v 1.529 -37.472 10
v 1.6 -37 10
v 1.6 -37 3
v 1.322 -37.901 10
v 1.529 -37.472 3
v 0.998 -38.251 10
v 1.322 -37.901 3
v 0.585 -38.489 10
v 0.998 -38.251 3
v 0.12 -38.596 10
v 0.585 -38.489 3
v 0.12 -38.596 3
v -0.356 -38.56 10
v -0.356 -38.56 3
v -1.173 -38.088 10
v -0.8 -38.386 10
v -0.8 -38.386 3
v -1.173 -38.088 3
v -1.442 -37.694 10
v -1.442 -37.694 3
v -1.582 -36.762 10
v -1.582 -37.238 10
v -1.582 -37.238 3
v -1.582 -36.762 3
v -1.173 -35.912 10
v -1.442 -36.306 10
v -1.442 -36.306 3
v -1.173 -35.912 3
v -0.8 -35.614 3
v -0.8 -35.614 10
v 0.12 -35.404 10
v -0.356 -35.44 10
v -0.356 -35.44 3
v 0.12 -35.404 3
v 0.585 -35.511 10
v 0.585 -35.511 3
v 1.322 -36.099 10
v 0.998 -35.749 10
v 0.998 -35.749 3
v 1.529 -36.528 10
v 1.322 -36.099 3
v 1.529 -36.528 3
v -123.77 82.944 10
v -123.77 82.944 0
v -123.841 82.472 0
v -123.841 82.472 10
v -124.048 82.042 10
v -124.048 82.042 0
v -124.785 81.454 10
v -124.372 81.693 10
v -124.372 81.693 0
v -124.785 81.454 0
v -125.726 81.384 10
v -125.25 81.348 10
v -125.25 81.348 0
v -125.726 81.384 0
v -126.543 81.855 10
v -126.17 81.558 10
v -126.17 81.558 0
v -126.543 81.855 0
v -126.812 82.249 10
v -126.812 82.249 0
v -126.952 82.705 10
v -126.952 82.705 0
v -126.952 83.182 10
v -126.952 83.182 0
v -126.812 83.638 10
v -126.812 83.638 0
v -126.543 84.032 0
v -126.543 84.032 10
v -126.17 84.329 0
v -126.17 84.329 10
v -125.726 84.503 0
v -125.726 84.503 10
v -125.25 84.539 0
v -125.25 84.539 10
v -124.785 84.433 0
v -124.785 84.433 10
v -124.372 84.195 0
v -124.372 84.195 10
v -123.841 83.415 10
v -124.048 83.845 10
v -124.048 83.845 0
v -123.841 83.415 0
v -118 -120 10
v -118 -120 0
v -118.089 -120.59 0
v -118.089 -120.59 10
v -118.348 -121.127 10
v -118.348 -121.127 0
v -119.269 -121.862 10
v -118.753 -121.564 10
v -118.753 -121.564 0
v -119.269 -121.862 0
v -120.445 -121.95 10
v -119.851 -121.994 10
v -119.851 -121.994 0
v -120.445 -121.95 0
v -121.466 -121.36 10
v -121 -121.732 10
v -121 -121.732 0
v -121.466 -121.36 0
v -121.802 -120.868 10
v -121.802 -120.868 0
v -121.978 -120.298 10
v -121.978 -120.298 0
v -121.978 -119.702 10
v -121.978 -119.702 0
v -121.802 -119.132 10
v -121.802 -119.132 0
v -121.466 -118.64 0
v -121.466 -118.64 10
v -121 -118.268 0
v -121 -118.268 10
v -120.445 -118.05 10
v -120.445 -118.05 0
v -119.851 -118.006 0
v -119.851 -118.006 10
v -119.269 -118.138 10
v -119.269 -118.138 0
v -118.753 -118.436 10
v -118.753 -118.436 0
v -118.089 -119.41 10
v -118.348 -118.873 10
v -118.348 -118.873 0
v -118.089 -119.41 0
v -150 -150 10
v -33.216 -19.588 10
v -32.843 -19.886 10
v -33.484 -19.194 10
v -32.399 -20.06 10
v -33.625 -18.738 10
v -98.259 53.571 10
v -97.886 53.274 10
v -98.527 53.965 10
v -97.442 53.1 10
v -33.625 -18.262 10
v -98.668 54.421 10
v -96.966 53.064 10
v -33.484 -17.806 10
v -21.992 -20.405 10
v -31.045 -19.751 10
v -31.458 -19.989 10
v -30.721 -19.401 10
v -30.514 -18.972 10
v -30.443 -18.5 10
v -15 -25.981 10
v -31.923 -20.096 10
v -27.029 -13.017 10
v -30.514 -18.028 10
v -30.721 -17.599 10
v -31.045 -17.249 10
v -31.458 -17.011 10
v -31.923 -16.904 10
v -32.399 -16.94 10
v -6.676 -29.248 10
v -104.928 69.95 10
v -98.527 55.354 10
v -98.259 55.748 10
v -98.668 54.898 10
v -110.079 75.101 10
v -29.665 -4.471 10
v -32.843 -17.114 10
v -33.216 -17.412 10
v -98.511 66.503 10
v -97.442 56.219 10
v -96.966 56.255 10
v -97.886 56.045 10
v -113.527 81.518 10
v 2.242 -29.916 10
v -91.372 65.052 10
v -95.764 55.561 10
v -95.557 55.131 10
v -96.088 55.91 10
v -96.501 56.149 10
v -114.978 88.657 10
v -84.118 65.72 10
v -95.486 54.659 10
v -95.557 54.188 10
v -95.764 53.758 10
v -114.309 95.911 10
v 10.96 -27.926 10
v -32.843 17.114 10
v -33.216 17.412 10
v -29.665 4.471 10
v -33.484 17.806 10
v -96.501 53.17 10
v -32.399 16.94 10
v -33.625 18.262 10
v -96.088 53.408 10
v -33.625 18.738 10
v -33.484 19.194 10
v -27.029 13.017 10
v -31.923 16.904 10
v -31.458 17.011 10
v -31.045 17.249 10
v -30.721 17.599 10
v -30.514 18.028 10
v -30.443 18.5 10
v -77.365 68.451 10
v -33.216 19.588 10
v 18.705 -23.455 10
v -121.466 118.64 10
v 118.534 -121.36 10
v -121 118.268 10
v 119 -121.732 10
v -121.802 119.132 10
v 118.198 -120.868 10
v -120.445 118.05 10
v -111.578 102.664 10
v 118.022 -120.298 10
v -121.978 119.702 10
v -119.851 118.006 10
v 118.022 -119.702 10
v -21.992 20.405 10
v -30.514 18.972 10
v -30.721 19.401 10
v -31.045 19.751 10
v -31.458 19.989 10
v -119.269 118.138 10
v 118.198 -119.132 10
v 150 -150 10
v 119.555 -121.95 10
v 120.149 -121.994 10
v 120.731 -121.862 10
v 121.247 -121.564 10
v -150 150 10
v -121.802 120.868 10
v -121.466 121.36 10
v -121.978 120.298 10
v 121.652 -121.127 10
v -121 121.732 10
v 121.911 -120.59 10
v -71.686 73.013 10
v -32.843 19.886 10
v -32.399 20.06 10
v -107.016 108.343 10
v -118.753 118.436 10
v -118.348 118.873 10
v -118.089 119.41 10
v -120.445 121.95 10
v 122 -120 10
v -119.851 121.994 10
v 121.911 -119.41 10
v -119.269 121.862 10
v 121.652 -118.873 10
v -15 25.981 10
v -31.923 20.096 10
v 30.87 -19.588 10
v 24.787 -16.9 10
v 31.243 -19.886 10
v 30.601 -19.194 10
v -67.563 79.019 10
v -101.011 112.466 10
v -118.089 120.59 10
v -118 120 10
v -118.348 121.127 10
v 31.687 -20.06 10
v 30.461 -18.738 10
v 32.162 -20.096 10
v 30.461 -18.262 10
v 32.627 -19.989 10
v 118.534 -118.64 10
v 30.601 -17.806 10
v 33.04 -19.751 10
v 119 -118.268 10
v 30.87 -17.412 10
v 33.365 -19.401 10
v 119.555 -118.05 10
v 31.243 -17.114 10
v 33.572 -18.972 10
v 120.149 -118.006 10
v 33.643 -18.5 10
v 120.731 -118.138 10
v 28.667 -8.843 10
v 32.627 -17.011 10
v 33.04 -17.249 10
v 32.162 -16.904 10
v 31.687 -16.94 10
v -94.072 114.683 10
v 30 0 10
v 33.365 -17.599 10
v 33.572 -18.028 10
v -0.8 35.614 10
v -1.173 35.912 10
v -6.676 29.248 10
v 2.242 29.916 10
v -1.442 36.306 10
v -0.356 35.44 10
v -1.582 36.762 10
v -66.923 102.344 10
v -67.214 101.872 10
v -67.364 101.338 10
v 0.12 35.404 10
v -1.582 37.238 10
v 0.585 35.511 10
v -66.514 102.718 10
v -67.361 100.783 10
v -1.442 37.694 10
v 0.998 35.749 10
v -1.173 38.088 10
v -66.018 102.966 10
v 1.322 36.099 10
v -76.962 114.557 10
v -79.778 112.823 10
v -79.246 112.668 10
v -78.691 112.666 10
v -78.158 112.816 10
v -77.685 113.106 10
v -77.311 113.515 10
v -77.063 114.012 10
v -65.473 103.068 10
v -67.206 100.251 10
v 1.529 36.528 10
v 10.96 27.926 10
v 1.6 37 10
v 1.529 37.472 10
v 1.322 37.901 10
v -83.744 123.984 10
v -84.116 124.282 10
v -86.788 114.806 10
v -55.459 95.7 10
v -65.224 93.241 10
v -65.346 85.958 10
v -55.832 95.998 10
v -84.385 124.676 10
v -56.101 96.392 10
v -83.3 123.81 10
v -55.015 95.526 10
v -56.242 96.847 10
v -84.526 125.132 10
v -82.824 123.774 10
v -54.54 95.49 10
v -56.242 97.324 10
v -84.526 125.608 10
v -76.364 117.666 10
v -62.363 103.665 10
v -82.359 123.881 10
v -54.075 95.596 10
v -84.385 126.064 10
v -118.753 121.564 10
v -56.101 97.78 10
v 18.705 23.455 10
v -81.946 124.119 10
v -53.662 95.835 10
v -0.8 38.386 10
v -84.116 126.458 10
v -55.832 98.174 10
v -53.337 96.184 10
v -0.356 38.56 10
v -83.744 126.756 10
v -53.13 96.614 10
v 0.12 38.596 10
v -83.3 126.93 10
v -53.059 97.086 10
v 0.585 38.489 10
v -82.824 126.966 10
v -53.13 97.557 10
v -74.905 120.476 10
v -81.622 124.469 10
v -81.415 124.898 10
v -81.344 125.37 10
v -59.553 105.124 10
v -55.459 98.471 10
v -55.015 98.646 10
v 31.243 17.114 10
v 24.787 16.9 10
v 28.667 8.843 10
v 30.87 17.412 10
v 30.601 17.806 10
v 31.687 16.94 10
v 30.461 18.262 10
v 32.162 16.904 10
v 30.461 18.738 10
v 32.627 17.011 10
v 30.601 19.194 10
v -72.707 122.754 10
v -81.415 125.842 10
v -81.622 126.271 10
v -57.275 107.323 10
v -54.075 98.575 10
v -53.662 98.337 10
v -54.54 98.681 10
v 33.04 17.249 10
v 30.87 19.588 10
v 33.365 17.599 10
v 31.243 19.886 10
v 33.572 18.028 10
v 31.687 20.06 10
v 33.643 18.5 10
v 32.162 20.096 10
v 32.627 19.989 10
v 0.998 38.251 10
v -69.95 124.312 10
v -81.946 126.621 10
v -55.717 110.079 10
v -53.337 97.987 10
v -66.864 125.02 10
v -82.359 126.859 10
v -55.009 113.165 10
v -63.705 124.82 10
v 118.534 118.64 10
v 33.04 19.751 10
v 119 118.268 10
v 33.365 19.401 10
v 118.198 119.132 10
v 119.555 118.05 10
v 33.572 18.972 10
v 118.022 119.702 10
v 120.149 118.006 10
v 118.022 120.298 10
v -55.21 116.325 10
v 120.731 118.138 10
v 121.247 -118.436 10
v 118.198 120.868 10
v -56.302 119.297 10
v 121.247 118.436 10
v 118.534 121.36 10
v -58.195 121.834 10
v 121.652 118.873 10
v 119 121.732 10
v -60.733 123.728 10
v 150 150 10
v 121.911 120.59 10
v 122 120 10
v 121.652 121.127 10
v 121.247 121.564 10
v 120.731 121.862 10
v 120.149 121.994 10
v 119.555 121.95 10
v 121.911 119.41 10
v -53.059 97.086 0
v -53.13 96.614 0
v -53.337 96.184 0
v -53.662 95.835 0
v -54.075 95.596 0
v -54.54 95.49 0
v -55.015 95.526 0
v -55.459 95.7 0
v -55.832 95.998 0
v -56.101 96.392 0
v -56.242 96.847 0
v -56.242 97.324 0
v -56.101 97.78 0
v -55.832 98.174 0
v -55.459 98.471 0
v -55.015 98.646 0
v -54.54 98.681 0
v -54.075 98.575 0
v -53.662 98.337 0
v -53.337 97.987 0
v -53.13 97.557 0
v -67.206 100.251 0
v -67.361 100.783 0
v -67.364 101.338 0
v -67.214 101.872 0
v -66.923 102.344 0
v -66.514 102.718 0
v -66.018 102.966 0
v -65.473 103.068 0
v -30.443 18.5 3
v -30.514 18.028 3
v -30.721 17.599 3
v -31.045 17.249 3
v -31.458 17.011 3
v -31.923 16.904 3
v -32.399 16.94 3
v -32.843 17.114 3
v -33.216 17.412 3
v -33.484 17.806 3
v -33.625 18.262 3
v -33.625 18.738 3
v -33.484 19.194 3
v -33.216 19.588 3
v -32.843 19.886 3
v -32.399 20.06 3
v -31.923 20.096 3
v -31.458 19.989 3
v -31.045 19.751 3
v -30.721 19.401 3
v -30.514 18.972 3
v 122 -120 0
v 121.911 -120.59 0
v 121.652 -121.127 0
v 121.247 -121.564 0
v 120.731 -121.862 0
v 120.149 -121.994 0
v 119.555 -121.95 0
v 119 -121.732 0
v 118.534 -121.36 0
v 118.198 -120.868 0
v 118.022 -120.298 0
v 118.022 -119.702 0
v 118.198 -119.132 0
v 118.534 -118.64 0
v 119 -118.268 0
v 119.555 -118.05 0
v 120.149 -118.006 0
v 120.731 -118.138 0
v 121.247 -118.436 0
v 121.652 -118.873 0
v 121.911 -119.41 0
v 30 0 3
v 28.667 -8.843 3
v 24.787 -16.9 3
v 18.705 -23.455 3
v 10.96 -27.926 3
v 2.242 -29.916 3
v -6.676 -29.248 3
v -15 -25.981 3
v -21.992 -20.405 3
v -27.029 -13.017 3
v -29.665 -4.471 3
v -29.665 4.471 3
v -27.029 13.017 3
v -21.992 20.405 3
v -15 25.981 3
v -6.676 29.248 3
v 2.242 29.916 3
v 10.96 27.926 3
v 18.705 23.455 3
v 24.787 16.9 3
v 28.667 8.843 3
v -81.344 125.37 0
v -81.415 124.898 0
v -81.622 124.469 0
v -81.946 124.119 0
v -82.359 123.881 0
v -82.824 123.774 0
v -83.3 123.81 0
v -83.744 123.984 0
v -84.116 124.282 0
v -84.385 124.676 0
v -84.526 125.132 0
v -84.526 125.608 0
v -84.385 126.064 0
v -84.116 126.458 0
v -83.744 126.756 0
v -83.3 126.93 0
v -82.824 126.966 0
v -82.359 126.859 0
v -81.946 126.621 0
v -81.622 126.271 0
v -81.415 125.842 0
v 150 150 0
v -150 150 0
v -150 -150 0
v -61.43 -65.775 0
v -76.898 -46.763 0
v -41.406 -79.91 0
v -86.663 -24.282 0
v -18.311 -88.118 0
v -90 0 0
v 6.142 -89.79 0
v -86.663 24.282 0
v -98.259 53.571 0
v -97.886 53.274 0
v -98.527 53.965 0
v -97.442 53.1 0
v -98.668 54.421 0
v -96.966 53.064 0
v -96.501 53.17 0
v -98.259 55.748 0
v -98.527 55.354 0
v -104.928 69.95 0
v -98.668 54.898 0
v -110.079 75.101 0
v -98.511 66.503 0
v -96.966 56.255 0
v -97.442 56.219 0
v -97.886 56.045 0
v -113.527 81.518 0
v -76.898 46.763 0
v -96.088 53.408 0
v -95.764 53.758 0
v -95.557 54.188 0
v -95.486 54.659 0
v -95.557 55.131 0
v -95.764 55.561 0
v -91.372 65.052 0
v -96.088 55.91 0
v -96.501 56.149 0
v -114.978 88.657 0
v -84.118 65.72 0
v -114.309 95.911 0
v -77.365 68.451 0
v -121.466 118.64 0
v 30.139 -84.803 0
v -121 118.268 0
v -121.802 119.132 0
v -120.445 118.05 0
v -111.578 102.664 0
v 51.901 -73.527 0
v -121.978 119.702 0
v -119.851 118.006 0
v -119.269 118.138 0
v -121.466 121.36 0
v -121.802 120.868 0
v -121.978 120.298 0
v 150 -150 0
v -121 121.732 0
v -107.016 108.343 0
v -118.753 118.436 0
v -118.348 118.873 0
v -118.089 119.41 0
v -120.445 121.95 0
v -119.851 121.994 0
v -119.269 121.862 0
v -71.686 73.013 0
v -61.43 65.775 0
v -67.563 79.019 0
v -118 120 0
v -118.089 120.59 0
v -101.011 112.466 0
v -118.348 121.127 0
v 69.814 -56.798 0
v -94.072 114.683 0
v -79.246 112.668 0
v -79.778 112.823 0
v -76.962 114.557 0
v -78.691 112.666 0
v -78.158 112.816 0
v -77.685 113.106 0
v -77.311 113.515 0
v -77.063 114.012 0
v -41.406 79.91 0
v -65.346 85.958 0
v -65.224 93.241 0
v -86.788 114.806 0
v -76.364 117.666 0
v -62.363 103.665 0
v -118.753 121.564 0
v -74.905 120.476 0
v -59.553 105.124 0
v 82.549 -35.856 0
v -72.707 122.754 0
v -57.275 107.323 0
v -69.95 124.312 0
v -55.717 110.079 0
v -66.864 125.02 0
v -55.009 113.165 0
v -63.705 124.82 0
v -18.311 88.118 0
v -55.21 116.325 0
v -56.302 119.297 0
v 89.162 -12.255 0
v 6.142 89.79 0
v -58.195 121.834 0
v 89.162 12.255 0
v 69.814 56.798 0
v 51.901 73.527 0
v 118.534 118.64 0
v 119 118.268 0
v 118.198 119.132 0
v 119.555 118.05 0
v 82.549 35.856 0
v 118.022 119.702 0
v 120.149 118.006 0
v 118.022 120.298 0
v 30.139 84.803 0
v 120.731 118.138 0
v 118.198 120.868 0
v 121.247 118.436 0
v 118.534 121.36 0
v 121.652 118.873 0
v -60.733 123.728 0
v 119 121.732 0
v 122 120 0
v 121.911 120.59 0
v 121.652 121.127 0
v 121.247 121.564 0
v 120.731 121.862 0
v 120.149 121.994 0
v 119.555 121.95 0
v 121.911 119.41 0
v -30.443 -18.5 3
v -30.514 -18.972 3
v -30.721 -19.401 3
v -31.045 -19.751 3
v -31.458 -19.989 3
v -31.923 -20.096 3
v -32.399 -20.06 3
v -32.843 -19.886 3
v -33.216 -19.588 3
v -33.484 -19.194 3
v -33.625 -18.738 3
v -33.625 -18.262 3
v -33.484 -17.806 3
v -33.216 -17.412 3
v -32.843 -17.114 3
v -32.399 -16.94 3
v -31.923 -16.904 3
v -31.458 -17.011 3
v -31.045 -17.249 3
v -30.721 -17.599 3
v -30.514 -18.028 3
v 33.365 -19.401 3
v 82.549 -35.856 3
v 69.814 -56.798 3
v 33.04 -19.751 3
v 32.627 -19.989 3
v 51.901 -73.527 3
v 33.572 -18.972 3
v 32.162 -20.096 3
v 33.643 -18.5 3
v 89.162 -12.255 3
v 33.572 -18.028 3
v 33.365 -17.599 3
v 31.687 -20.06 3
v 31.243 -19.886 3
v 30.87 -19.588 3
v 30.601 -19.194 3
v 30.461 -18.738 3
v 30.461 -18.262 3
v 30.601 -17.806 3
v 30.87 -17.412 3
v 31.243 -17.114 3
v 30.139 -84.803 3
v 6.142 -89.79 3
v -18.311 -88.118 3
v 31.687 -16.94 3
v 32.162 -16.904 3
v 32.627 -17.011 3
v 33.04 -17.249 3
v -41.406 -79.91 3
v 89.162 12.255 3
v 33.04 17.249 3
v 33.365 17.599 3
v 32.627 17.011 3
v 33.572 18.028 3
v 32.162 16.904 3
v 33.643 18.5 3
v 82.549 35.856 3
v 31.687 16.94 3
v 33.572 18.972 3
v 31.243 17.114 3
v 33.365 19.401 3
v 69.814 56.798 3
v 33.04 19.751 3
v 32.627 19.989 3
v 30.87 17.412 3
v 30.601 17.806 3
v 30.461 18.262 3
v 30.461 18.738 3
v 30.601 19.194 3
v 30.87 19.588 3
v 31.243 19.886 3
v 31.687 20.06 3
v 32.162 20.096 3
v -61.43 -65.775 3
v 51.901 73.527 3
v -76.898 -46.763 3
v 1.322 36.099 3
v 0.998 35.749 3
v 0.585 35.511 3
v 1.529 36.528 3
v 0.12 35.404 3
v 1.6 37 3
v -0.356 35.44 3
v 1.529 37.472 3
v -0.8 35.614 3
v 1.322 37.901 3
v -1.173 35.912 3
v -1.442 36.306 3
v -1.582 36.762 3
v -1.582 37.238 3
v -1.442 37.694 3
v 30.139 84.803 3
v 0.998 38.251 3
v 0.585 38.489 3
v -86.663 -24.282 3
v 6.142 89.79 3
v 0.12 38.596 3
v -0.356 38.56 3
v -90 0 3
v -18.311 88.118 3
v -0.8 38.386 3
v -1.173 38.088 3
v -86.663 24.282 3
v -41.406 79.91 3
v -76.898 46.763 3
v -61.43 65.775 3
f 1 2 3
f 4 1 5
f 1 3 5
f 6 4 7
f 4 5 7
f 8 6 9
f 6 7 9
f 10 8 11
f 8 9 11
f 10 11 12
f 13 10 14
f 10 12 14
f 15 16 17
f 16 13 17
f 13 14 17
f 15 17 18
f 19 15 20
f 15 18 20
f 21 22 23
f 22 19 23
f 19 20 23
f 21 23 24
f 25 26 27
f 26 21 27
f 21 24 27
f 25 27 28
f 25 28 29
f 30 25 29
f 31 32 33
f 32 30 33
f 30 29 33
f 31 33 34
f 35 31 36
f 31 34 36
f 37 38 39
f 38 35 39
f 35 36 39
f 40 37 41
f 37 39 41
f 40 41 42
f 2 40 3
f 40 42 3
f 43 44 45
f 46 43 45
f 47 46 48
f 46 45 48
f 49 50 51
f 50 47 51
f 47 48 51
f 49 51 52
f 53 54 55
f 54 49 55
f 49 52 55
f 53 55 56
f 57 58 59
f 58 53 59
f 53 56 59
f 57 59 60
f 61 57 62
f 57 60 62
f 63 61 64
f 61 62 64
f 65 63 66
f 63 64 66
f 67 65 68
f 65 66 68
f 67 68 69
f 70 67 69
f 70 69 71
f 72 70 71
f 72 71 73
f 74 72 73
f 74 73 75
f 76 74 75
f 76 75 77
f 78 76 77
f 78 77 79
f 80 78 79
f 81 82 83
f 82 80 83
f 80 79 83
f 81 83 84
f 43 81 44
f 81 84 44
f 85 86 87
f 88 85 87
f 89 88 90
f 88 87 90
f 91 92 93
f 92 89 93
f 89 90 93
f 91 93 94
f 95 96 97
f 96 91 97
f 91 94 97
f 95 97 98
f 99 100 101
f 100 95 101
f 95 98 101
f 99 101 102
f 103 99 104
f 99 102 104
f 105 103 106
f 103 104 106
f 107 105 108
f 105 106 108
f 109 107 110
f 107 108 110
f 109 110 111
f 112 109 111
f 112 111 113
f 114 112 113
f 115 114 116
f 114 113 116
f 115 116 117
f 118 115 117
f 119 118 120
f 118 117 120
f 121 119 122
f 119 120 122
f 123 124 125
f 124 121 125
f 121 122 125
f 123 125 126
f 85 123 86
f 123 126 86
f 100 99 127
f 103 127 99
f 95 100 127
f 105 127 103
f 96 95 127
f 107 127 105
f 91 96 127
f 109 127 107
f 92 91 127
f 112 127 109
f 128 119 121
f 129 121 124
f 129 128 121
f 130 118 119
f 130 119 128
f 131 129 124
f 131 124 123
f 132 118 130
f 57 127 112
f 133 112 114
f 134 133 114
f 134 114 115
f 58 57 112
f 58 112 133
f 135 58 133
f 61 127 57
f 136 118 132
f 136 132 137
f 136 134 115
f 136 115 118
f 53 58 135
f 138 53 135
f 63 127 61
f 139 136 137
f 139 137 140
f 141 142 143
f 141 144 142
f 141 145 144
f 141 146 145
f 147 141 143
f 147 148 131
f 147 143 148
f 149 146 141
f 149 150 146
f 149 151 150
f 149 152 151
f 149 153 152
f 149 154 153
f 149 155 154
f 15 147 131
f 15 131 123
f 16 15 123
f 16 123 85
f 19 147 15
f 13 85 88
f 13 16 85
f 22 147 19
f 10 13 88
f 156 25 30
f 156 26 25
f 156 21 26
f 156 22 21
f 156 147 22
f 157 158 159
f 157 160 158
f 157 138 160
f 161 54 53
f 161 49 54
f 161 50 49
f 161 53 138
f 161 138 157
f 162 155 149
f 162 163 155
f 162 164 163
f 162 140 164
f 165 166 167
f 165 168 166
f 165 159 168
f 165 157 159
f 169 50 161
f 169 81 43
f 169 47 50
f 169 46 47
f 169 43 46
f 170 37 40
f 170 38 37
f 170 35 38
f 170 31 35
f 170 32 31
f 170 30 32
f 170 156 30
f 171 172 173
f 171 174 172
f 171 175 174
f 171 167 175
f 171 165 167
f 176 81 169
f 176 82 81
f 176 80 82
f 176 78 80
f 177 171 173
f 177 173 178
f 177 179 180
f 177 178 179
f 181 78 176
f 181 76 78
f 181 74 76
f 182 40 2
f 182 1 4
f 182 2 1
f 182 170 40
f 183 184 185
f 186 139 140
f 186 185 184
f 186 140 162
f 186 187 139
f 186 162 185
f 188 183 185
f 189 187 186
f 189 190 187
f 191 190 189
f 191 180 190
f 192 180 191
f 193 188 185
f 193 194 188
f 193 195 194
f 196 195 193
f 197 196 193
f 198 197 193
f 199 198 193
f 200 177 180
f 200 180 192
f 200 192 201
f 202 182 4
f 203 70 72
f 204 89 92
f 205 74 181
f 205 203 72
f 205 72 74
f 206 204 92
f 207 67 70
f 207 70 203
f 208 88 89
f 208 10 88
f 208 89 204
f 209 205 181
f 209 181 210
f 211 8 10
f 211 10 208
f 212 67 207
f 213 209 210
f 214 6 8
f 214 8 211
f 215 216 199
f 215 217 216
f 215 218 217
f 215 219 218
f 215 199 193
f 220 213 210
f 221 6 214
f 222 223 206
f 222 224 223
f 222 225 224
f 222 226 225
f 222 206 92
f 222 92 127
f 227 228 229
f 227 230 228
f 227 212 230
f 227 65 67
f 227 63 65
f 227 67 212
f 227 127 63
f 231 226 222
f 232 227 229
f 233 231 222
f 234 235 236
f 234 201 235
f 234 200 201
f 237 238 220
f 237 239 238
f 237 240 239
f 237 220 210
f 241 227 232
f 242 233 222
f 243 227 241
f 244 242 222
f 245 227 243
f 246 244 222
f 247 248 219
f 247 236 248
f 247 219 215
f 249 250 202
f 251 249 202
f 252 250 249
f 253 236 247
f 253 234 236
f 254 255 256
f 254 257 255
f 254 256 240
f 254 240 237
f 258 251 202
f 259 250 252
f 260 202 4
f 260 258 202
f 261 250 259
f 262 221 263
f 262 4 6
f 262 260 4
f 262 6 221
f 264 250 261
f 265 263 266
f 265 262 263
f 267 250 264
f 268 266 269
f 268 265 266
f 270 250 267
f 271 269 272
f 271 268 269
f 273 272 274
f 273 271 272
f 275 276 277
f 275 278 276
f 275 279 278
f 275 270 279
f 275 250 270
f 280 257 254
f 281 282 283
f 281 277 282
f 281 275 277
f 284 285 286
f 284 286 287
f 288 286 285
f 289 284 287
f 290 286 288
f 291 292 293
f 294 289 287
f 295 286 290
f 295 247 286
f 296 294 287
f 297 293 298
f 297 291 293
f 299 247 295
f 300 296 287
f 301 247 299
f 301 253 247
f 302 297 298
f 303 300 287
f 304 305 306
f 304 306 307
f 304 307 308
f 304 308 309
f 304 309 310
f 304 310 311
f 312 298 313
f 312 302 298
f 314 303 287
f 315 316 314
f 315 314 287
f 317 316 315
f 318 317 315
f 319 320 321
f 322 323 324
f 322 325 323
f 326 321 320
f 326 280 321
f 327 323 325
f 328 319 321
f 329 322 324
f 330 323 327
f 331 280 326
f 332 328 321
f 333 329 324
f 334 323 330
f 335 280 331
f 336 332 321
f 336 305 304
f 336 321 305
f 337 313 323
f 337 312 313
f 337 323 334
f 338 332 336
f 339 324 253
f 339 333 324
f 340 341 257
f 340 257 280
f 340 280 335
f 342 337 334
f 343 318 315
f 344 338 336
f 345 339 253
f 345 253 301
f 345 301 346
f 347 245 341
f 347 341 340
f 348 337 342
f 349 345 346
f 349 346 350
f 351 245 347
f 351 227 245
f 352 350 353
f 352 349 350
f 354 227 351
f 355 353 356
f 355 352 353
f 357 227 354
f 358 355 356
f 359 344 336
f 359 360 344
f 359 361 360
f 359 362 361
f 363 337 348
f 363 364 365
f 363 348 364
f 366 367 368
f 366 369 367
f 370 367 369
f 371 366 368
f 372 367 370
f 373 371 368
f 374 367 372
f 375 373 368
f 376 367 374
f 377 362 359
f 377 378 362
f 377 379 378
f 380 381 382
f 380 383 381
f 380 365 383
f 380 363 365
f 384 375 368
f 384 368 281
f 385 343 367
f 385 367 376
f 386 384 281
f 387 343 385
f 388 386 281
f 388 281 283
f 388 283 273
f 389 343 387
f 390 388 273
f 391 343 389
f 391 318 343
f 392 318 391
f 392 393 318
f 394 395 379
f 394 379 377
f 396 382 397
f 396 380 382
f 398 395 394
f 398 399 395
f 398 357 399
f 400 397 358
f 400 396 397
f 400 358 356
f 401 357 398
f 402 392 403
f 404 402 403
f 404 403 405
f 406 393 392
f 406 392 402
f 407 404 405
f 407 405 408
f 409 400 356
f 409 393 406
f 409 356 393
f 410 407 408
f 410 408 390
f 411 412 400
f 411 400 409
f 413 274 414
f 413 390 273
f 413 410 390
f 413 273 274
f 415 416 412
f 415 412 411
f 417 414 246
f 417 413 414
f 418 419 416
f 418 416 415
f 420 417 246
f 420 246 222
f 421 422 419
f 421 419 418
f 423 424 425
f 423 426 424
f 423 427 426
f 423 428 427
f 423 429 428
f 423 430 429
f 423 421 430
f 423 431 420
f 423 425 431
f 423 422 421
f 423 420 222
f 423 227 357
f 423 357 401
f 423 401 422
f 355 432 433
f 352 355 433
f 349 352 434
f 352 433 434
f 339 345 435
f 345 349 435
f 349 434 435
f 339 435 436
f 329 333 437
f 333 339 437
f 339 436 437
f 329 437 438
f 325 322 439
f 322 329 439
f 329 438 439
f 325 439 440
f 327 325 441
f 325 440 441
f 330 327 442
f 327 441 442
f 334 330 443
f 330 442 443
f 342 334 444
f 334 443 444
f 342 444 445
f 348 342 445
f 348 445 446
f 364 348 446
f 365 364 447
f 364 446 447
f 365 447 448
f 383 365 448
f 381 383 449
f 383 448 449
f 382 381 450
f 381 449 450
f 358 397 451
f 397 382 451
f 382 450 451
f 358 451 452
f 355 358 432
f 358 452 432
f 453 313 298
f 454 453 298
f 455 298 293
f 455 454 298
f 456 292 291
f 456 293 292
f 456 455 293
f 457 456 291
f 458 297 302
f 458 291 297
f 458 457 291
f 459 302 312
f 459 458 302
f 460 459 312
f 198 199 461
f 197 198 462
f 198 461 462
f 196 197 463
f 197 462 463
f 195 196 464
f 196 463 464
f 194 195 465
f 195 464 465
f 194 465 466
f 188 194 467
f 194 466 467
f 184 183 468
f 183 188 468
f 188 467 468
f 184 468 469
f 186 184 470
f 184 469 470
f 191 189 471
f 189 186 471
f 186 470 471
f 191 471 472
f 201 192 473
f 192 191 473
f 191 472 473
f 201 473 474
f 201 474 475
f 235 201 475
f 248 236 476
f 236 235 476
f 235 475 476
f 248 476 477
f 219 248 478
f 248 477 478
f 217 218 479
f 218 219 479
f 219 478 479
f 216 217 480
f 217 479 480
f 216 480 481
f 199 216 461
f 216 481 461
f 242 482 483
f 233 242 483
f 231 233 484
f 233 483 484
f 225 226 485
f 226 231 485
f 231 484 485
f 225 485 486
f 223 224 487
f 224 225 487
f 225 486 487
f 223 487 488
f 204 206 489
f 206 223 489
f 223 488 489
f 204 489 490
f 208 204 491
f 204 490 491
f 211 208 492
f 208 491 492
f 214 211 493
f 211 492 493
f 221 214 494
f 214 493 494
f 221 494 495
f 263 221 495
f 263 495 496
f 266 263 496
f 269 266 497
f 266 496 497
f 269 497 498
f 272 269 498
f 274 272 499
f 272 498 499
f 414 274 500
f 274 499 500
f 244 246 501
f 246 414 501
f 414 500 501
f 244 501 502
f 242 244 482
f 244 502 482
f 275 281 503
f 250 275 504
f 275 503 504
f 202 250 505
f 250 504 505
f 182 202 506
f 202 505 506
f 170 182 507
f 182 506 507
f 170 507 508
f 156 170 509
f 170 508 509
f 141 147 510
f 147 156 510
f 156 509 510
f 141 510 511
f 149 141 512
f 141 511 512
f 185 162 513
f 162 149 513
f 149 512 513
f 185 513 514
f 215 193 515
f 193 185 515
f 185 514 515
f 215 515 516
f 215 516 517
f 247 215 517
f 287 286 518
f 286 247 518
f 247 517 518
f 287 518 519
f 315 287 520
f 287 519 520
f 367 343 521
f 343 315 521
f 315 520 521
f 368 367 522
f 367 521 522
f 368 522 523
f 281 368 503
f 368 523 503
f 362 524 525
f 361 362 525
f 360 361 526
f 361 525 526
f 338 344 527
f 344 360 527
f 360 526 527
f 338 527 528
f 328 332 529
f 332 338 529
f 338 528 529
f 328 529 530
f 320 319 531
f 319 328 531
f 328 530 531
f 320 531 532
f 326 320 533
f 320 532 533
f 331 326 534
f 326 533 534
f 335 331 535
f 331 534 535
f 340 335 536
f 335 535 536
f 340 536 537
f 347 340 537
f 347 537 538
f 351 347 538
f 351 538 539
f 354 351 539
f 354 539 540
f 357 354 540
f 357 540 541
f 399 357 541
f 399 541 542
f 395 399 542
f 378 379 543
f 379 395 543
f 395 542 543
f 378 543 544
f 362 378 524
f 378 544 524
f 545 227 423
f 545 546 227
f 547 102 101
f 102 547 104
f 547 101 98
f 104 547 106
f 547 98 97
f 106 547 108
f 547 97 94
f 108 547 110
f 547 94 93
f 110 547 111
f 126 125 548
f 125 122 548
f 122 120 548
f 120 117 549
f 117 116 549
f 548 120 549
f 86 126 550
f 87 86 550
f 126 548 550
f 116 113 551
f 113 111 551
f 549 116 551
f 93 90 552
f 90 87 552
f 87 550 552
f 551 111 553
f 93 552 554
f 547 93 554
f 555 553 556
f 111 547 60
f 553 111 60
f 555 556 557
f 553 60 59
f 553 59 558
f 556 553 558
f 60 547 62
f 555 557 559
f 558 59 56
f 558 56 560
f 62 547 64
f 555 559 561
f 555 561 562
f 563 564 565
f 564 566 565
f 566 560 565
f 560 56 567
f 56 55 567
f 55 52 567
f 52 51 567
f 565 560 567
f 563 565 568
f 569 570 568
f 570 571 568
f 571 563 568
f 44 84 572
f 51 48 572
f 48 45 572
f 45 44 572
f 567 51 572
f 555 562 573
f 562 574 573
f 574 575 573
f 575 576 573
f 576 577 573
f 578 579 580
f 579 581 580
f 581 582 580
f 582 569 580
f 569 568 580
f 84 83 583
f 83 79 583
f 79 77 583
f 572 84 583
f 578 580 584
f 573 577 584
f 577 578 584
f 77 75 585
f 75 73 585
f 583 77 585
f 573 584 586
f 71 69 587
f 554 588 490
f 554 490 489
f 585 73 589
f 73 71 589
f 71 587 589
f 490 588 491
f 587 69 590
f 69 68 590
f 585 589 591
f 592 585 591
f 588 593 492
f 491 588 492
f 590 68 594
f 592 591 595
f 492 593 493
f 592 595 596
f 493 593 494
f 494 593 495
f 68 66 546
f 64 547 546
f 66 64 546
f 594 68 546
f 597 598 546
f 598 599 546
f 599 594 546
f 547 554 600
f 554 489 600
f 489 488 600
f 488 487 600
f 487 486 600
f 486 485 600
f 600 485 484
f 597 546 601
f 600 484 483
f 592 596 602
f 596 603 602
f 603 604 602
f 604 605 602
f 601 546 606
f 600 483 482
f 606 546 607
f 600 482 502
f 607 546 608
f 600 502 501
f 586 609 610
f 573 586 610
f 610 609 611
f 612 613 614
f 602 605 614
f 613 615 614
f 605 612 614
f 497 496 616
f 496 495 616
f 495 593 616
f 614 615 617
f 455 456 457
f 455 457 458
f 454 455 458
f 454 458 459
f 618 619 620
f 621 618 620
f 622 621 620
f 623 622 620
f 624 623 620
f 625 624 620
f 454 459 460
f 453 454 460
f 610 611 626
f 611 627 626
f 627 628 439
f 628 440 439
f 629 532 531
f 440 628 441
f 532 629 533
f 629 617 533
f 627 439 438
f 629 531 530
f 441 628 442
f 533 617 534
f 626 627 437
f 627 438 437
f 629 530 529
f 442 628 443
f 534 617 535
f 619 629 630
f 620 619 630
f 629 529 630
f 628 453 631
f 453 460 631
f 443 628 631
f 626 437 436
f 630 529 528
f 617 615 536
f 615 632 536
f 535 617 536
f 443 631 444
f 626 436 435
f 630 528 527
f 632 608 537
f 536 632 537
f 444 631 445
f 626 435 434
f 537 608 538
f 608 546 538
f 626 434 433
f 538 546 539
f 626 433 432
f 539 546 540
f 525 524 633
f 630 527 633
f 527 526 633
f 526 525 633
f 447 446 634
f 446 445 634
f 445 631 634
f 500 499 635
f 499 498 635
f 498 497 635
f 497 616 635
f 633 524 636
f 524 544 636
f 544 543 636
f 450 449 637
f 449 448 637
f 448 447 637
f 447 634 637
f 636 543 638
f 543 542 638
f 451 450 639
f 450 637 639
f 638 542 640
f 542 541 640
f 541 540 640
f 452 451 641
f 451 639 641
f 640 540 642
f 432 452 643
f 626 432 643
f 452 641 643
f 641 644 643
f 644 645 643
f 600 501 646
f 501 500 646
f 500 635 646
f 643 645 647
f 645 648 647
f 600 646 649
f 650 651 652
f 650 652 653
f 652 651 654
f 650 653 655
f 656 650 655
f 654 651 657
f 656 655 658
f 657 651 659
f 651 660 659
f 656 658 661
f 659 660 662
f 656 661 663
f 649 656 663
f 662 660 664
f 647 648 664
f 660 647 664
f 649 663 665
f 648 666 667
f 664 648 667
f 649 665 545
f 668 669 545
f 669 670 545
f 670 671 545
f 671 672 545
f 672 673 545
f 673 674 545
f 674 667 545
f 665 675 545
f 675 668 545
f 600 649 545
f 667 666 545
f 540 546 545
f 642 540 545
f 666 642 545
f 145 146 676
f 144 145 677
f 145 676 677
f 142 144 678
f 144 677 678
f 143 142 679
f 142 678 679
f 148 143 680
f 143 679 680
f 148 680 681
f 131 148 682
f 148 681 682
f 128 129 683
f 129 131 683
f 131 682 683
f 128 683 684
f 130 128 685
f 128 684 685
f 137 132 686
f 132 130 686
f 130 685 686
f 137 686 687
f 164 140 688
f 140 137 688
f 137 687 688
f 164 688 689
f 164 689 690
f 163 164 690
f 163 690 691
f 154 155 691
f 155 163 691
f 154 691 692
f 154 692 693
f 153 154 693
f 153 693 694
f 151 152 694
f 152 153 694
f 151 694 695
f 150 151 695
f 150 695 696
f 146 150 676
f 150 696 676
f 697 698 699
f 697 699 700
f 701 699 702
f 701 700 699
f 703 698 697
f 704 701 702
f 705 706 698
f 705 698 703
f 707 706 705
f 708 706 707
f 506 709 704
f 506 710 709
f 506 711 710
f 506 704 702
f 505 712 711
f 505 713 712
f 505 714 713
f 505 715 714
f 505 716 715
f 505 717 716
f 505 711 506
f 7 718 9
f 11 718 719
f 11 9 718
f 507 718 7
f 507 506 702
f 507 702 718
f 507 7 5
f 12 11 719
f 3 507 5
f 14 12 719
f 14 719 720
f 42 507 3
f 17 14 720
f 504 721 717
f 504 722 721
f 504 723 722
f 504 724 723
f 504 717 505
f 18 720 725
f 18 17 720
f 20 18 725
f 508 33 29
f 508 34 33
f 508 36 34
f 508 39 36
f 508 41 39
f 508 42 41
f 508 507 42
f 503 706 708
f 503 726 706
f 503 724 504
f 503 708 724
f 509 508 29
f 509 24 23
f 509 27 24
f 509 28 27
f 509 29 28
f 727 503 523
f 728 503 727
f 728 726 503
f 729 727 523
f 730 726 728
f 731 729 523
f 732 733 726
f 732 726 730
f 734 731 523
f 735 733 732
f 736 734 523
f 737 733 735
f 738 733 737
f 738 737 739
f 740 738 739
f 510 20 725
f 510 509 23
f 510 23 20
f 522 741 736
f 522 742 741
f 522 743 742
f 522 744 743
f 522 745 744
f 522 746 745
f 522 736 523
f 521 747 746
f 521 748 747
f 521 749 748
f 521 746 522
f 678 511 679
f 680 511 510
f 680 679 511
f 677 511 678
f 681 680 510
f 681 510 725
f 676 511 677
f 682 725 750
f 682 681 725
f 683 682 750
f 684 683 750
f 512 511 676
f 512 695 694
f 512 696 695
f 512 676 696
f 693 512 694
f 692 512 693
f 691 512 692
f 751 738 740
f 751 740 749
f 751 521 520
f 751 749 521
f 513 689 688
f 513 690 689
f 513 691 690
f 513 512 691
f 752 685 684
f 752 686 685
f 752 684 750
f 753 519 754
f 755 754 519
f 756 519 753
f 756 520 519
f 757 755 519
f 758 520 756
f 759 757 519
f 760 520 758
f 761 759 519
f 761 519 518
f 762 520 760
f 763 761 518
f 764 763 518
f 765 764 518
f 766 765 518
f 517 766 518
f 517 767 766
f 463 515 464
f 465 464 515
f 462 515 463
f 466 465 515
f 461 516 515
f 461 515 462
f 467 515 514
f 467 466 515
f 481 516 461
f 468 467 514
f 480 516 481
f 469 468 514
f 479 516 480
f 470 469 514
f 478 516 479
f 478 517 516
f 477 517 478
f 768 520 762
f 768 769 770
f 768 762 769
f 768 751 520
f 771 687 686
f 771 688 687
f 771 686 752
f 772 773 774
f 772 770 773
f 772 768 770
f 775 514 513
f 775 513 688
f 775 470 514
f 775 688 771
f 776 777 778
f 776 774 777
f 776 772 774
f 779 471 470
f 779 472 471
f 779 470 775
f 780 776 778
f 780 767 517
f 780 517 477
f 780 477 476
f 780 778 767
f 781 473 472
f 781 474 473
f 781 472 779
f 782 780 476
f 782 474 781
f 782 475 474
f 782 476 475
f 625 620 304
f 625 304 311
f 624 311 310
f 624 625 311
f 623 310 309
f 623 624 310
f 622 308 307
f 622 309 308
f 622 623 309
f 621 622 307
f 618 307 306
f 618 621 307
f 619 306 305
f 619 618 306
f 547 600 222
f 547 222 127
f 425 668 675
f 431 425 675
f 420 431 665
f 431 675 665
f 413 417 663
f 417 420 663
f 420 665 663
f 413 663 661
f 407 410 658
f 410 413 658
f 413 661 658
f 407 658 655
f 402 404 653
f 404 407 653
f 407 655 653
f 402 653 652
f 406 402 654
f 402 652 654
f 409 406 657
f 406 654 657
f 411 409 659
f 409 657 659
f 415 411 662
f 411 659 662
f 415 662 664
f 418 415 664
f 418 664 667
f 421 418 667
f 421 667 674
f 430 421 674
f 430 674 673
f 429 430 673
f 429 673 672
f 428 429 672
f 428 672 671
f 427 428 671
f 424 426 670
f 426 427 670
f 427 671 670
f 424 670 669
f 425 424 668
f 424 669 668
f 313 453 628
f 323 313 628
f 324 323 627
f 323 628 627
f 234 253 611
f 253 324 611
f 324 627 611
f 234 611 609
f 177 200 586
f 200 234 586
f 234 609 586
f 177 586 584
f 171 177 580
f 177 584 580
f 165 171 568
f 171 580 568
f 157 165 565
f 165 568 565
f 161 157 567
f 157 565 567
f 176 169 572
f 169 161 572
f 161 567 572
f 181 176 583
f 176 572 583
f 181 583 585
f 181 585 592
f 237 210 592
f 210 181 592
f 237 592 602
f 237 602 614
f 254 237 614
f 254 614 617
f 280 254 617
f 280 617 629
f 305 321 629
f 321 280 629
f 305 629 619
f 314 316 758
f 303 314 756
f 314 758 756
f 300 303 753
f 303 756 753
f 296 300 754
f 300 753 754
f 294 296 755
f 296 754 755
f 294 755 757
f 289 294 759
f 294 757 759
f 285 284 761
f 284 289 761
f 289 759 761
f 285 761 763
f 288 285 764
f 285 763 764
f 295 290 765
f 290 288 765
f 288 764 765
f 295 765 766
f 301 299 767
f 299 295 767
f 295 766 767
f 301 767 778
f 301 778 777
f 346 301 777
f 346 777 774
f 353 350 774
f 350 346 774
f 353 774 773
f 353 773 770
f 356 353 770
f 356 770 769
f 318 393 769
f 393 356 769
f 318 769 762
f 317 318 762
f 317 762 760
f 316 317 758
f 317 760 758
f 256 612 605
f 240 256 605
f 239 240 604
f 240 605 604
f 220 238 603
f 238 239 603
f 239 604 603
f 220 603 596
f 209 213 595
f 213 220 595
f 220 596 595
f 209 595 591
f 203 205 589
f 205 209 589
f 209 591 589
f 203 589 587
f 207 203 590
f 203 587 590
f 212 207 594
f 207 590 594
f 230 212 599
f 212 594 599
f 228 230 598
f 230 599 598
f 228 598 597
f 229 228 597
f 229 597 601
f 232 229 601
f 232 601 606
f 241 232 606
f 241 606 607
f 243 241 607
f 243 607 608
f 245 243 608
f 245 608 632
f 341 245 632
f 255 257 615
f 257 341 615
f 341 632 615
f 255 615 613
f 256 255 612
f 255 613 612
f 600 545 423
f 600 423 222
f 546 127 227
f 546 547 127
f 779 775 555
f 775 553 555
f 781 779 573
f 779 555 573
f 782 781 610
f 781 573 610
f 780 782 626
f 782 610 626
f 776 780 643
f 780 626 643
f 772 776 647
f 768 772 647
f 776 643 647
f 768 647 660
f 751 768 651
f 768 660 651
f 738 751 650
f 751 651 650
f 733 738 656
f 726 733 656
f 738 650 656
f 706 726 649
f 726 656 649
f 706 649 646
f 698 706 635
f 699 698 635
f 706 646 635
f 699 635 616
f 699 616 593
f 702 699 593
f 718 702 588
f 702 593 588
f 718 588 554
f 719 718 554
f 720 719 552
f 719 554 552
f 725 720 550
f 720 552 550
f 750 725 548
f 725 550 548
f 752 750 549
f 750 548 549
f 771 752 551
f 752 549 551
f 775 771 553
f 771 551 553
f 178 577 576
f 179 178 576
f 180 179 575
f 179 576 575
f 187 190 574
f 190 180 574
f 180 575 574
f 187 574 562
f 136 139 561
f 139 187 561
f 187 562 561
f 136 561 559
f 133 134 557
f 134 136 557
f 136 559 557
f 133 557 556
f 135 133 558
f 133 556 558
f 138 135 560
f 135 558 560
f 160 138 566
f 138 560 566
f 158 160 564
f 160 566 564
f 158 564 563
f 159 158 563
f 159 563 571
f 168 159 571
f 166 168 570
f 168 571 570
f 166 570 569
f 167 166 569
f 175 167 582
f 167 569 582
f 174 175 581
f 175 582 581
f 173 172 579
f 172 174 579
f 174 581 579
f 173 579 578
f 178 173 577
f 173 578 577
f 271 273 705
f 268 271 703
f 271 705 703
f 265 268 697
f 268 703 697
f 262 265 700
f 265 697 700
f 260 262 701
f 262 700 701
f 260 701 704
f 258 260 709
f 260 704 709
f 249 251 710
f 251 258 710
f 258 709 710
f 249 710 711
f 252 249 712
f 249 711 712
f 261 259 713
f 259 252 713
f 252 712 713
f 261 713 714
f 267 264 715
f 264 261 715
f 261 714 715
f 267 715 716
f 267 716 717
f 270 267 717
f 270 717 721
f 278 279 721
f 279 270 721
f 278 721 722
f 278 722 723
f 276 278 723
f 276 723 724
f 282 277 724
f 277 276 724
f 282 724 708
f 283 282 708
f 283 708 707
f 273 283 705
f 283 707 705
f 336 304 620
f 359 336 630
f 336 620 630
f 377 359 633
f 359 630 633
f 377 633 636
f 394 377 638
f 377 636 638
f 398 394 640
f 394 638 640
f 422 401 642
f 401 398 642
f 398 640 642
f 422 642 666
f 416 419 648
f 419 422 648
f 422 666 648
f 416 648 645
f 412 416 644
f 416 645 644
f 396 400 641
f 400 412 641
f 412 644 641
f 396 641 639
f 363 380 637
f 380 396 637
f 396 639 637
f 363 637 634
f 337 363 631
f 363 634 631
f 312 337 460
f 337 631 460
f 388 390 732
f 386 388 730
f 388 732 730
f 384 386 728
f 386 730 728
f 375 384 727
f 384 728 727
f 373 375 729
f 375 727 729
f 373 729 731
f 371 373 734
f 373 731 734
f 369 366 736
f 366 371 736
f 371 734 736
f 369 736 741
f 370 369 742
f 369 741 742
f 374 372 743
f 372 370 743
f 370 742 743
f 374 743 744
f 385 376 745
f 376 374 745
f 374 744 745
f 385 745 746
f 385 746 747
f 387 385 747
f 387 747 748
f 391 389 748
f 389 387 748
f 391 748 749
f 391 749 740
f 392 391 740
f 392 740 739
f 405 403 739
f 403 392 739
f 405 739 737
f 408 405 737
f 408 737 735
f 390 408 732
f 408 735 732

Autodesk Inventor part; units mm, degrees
ref_plane "YZ Plane" through (0, 0, 0) normal (1, 0, 0) x (0, 1, 0)
ref_plane "XZ Plane" through (0, 0, 0) normal (0, 1, 0) x (-1, 0, 0)
ref_plane "XY Plane" through (0, 0, 0) normal (0, 0, 1) x (1, 0, 0)
sketch "スケッチ1" plane through (-150, -150, 0) normal (0, 0, 1) x (1, 0, 0)
  circle A0 centre (59.9853, 240.0147) radius 24 construction
  circle A1 centre (59.9853, 240.0147) radius 24 construction
  circle A2 centre (84.0269, 264.0563) radius 10 construction
  line L0 (84.0269, 264.0563) -> (59.9853, 240.0147) construction
  line L1 (59.9853, 240.0147) -> (84.0269, 215.9731) construction
  arc A3 (84.5273, 253.0677) -> (73.0383, 264.5567) centre (84.0269, 264.0563) ccw
  arc A4 (70.2215, 262.823) -> (82.7936, 250.2509) centre (59.9853, 240.0147) ccw
  arc A5 (84.5273, 253.0677) -> (82.7936, 250.2509) centre (84.6183, 251.0698) ccw
  arc A6 (70.2215, 262.823) -> (73.0383, 264.5567) centre (71.0404, 264.6477) ccw
  line L2 (67.0564, 275.37) -> (24.63, 232.9436) construction
  line L3 (24.63, 232.9436) -> (52.9142, 204.6594) construction
  line L4 (52.9142, 204.6594) -> (95.3406, 247.0858) construction
  line L5 (95.3406, 247.0858) -> (67.0564, 275.37) construction
  line L6 (67.0564, 275.37) -> (52.9142, 204.6594) construction
  line L7 (24.63, 232.9436) -> (95.3406, 247.0858) construction
  circle A7 centre (95.3406, 247.0858) radius 1.6
  circle A8 centre (52.9142, 204.6594) radius 1.6
  circle A9 centre (24.63, 232.9436) radius 1.6
  circle A10 centre (67.0564, 275.37) radius 1.6
  line L8 (270, 30) -> (30, 30) construction
  line L9 (30, 30) -> (30, 270) construction
  line L10 (30, 270) -> (270, 270) construction
  line L11 (270, 270) -> (270, 30) construction
  line L12 (270, 30) -> (30, 270) construction
  line L13 (30, 30) -> (270, 270) construction
  circle A11 centre (30, 270) radius 2
  circle A12 centre (270, 270) radius 2
  circle A13 centre (30, 30) radius 2
  circle A14 centre (270, 30) radius 2
  circle A15 centre (150, 150) radius 30
  line L14 (150, 113) -> (117.9571, 131.5) construction
  line L15 (117.9571, 131.5) -> (117.9571, 168.5) construction
  line L16 (117.9571, 168.5) -> (150, 187) construction
  line L17 (150, 187) -> (182.0429, 168.5) construction
  line L18 (182.0429, 168.5) -> (182.0429, 131.5) construction
  line L19 (182.0429, 131.5) -> (150, 113) construction
  circle A16 centre (150, 150) radius 37 construction
  circle A17 centre (150, 113) radius 1.6
  circle A18 centre (54.1207, 93.2509) radius 1.6 construction
  line L20 (117.9571, 131.5) -> (117.9571, 168.5) construction
  line L21 (150, 113) -> (117.9571, 131.5) construction
  line L22 (117.9571, 168.5) -> (150, 187) construction
  line L23 (182.0429, 131.5) -> (150, 113) construction
  circle A19 centre (150, 150) radius 30 construction
  line L24 (150, 187) -> (182.0429, 168.5) construction
  line L25 (182.0429, 168.5) -> (182.0429, 131.5) construction
  circle A20 centre (150, 150) radius 37 construction
  circle A21 centre (182.0429, 131.5) radius 1.6
  circle A22 centre (151.2065, 38.5916) radius 1.6 construction
  line L26 (150, 113) -> (117.9571, 131.5) construction
  line L27 (182.0429, 131.5) -> (150, 113) construction
  line L28 (117.9571, 131.5) -> (117.9571, 168.5) construction
  line L29 (182.0429, 168.5) -> (182.0429, 131.5) construction
  circle A23 centre (150, 150) radius 30 construction
  line L30 (117.9571, 168.5) -> (150, 187) construction
  line L31 (150, 187) -> (182.0429, 168.5) construction
  circle A24 centre (150, 150) radius 37 construction
  circle A25 centre (182.0429, 168.5) radius 1.6
  circle A26 centre (247.0858, 95.3406) radius 1.6 construction
  line L32 (182.0429, 131.5) -> (150, 113) construction
  line L33 (182.0429, 168.5) -> (182.0429, 131.5) construction
  line L34 (150, 113) -> (117.9571, 131.5) construction
  line L35 (150, 187) -> (182.0429, 168.5) construction
  circle A27 centre (150, 150) radius 30 construction
  line L36 (117.9571, 131.5) -> (117.9571, 168.5) construction
  line L37 (117.9571, 168.5) -> (150, 187) construction
  circle A28 centre (150, 150) radius 37 construction
  circle A29 centre (150, 187) radius 1.6
  circle A30 centre (245.8793, 206.7491) radius 1.6 construction
  line L38 (182.0429, 168.5) -> (182.0429, 131.5) construction
  line L39 (150, 187) -> (182.0429, 168.5) construction
  line L40 (182.0429, 131.5) -> (150, 113) construction
  line L41 (117.9571, 168.5) -> (150, 187) construction
  circle A31 centre (150, 150) radius 30 construction
  line L42 (150, 113) -> (117.9571, 131.5) construction
  line L43 (117.9571, 131.5) -> (117.9571, 168.5) construction
  circle A32 centre (150, 150) radius 37 construction
  circle A33 centre (117.9571, 168.5) radius 1.6
  circle A34 centre (148.7935, 261.4084) radius 1.6 construction
  line L44 (150, 187) -> (182.0429, 168.5) construction
  line L45 (117.9571, 168.5) -> (150, 187) construction
  line L46 (182.0429, 168.5) -> (182.0429, 131.5) construction
  line L47 (117.9571, 131.5) -> (117.9571, 168.5) construction
  circle A35 centre (150, 150) radius 30 construction
  line L48 (182.0429, 131.5) -> (150, 113) construction
  line L49 (150, 113) -> (117.9571, 131.5) construction
  circle A36 centre (150, 150) radius 37 construction
  circle A37 centre (117.9571, 131.5) radius 1.6
  line L50 (0, 300) -> (300, 300)
  line L51 (300, 300) -> (300, 0)
  line L52 (300, 0) -> (0, 0)
  line L53 (0, 0) -> (0, 300)
  line L54 (0, 300) -> (300, 0) construction
  line L55 (300, 300) -> (0, 0) construction
  point P0 (150, 150)
  point P1 (81.1985, 261.2279)
  point P2 (150, 150)
  point P3 (59.8791, 125.8522)
  point P4 (150, 150)
  point P5 (125.8522, 59.8791)
  point P6 (150, 150)
  point P7 (215.9731, 84.0269)
  point P8 (150, 150)
  point P9 (240.1209, 174.1478)
  point P10 (150, 150)
  point P11 (174.1478, 240.1209)
  dimension "d30" = 74
  dimension "d6" = 48
  dimension "d7" = 20
  dimension "d10" = 25
  dimension "d11" = 11
  dimension "d12" = 2
  dimension "d15" = 40
  dimension "d16" = 60
  dimension "d17" = 3.2
  dimension "d18" = 240
  dimension "d19" = 4
  dimension "d22" = 240
  dimension "d25" = 240
  dimension "d28" = 60
  dimension "d31" = 3.2
  dimension "d34" = 360
  dimension "d36" = 300
  dimension "d39" = 127.3
  dimension "d40" = 3.2
  dimension "d41" = 48
extrude "押し出し2" add sketch "スケッチ1" along normal blind 10
sketch "スケッチ2" plane through (-150, -150, 0) normal (0, 0, -1) x (-1, 0, 0)
  circle A0 centre (-150, 150) radius 90
  dimension "d42" = 180
extrude "押し出し3" cut sketch "スケッチ2" against normal blind 3
properties part number "ロボットベース2019" material "マツ材"
